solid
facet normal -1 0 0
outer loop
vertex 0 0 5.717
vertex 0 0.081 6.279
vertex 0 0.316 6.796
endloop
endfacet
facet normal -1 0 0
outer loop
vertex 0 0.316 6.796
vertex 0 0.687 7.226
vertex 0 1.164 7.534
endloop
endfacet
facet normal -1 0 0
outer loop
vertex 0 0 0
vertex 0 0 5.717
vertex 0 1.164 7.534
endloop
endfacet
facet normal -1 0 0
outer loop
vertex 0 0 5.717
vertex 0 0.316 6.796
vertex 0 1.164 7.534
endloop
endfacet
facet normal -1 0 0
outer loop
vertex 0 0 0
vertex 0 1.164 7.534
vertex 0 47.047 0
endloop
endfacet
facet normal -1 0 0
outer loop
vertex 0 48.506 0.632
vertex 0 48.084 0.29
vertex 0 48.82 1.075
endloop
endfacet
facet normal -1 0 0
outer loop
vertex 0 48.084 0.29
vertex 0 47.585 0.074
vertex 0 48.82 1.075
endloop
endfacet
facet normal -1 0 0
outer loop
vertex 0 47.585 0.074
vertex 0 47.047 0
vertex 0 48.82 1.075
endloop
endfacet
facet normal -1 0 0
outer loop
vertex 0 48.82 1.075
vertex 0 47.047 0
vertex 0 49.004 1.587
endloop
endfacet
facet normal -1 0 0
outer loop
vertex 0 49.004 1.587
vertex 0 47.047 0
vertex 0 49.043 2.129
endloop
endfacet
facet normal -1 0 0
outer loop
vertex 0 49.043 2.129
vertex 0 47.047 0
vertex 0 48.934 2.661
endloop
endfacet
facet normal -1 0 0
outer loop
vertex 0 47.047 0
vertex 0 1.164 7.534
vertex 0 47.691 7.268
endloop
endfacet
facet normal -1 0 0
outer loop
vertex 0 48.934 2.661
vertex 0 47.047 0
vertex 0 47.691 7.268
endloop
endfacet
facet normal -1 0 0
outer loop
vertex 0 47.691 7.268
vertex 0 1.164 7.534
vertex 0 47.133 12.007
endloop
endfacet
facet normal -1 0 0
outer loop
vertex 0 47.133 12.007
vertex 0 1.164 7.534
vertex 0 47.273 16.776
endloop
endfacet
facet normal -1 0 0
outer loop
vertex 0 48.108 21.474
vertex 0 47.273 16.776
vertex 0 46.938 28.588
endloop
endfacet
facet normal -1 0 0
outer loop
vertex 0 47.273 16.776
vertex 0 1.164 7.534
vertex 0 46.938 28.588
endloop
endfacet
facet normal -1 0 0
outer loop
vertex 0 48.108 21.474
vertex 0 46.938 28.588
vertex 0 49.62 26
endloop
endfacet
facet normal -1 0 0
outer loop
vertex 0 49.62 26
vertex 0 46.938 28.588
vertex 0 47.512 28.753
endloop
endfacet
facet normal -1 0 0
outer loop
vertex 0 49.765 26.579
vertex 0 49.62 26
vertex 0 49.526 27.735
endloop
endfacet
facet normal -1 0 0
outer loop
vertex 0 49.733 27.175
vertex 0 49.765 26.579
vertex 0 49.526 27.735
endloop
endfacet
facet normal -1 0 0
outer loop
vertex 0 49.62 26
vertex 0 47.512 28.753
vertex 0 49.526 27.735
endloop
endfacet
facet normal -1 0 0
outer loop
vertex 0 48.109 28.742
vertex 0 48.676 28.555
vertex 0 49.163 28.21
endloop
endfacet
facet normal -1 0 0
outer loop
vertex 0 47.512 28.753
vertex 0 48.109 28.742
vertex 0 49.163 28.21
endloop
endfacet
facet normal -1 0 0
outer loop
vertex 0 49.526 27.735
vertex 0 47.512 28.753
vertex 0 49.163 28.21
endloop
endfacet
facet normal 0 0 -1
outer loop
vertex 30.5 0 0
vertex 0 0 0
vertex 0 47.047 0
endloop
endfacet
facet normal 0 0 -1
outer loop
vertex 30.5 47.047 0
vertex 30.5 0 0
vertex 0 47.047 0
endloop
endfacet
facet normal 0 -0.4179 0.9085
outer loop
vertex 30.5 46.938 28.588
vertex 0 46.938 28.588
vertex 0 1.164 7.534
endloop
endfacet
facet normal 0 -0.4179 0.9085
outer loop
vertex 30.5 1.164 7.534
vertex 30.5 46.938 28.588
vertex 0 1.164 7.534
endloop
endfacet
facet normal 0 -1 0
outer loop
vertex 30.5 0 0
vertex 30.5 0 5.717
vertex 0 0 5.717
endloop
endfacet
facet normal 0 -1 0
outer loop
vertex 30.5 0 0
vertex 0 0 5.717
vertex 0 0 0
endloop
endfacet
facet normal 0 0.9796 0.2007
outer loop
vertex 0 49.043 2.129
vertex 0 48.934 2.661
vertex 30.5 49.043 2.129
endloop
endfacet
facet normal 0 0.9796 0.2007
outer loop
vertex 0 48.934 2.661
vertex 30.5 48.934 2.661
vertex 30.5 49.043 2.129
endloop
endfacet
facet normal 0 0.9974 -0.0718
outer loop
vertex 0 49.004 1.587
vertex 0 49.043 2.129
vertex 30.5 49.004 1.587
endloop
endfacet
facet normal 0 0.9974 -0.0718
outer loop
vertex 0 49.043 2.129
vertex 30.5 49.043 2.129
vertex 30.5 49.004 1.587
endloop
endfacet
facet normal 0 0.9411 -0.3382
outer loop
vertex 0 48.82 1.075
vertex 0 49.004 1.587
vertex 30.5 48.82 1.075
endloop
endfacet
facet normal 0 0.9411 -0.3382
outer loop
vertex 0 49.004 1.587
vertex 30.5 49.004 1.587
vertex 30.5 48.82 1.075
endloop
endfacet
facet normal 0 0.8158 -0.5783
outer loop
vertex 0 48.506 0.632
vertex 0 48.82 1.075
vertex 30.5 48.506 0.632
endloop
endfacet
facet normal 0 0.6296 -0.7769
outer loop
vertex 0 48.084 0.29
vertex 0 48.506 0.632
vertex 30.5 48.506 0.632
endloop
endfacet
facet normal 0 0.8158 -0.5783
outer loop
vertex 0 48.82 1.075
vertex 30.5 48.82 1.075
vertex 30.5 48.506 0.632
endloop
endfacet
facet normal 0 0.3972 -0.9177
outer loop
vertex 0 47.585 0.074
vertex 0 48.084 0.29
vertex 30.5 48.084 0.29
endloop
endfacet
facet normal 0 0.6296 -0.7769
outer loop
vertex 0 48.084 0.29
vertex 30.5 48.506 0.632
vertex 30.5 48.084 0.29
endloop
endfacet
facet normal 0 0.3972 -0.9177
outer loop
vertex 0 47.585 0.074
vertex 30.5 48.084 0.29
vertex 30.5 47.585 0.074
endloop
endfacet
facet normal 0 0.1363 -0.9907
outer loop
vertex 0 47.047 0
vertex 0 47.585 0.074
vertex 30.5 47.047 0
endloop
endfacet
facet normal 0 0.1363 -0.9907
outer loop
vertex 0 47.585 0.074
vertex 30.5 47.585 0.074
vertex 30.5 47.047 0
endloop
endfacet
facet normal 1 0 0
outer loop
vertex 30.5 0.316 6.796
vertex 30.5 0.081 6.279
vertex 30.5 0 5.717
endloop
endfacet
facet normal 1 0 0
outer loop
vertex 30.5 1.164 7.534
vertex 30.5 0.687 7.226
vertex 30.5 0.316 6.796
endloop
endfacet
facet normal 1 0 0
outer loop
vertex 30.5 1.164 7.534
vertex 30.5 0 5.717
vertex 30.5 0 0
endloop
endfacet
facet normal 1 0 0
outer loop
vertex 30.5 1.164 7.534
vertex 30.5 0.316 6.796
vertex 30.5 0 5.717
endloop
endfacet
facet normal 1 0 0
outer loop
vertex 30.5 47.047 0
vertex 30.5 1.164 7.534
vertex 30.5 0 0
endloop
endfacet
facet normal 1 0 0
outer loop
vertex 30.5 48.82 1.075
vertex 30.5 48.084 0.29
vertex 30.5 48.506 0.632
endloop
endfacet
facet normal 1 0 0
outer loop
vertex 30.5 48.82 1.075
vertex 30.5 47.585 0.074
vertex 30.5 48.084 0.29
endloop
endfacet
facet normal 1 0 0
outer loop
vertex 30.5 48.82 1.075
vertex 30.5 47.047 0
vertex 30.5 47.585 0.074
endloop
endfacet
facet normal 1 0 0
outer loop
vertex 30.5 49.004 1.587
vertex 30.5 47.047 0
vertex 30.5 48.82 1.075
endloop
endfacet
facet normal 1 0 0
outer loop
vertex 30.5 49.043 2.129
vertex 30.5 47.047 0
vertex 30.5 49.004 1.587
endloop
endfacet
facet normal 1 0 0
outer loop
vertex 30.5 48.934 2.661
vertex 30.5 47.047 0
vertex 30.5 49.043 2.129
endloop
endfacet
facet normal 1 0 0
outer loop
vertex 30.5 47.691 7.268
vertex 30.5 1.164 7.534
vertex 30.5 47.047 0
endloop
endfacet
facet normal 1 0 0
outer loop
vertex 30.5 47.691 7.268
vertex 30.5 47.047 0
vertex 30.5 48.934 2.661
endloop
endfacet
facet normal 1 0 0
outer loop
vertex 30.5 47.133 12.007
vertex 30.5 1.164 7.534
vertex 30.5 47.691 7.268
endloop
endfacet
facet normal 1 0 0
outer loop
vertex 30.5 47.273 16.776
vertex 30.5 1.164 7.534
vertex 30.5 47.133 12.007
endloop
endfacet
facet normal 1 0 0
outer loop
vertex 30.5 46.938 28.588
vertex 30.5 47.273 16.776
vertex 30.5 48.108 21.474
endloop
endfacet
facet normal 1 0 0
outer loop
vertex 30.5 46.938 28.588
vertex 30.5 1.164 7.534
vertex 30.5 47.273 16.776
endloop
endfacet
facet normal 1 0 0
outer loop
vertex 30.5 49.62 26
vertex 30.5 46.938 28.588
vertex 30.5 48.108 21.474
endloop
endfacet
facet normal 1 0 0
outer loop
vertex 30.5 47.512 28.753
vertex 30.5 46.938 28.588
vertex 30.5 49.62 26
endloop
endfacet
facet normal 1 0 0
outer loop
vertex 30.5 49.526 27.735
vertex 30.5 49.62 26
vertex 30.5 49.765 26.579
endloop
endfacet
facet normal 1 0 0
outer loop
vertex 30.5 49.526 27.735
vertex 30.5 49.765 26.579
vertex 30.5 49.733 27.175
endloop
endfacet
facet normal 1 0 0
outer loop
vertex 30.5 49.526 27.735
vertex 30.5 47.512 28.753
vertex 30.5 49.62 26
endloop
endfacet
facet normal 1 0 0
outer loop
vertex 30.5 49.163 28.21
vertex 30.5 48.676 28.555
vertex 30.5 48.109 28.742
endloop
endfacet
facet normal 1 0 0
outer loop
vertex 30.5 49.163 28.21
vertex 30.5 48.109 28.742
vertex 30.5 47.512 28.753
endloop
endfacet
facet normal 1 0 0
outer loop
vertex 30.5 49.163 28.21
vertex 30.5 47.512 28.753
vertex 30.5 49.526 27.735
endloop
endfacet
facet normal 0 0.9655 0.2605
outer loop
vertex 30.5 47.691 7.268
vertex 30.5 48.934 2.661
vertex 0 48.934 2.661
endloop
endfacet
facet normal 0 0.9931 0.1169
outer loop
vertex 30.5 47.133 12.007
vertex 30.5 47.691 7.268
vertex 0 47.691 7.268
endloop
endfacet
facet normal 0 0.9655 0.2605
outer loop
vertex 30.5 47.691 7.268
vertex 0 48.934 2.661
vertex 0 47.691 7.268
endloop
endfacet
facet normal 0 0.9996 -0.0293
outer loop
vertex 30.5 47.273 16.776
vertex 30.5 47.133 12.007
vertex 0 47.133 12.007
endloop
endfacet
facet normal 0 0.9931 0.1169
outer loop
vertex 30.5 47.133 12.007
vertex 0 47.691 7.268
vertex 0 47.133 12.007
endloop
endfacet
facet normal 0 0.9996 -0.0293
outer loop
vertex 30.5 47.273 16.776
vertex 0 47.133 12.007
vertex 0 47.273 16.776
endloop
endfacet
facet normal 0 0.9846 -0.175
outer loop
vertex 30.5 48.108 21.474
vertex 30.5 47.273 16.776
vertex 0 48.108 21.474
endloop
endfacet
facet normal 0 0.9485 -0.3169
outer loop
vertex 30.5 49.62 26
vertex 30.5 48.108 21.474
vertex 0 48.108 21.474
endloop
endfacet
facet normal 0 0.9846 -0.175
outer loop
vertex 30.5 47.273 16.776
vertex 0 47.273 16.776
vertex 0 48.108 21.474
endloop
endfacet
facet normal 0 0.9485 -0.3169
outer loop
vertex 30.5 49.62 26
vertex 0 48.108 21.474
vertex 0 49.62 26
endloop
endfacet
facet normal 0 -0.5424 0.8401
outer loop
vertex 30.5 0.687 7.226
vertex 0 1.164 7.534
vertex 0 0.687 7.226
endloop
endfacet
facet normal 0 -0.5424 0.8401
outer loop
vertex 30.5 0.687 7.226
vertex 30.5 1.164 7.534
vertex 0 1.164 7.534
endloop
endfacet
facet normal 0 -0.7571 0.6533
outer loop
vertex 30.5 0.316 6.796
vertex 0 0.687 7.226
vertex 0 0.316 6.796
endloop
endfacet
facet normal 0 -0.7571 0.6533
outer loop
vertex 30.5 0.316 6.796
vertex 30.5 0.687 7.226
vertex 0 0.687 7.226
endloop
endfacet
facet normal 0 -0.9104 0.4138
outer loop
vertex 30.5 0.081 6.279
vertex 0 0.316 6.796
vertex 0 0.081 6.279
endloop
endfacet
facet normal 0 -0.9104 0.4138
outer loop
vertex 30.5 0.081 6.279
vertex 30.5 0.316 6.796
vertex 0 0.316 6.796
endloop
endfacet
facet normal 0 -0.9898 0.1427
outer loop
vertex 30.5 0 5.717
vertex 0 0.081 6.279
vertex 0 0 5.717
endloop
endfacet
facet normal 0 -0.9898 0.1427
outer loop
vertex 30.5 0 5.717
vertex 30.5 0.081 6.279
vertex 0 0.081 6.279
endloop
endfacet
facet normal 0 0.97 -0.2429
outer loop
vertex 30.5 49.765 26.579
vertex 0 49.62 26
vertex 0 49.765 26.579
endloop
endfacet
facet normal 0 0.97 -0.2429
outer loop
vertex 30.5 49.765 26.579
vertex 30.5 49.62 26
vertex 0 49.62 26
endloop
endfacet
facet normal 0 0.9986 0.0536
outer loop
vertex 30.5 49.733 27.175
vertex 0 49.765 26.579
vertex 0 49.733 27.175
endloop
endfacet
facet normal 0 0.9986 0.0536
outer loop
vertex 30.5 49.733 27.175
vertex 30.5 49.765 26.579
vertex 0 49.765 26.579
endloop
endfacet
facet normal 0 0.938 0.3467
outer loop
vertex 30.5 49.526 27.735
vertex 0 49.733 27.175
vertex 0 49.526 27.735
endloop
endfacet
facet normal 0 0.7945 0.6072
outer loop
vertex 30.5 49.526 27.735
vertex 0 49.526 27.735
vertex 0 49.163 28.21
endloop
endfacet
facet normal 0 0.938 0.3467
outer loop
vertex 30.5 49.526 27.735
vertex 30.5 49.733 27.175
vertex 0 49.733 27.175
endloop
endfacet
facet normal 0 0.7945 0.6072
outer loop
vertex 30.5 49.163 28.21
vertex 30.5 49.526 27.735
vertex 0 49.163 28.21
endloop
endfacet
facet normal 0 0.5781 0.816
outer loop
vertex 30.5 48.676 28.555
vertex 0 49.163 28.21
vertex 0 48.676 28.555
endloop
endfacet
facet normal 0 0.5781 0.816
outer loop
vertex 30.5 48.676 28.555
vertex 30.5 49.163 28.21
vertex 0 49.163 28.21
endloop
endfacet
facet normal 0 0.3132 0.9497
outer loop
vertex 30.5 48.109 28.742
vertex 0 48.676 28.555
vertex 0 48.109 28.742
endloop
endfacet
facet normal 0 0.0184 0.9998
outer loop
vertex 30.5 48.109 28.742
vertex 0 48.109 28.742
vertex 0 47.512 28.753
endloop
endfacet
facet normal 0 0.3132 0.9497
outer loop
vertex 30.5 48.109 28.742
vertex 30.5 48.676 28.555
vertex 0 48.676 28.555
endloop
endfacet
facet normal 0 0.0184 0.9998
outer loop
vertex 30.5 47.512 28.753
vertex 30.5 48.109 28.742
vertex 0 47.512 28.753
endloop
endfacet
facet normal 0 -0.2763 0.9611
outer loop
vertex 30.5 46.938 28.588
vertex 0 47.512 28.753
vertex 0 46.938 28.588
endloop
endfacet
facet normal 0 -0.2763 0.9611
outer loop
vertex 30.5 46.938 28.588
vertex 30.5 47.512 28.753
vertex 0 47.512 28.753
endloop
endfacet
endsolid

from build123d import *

# Parameters (mm, degrees)
F1_DEPTH = 30.5
F2_R     = 2
F3_R     = 2


with BuildPart() as f1:
    # F0 (on Right) → F1 (new body)
    with BuildSketch(Plane.YZ):
        with BuildLine():
            Line((0, 6.9982859343), (0, 0))
            Line((0, 0), (50, 0))
            ThreePointArc((50, 0), (47.1879454394, 15.8045232241), (52.2596416003, 31.035035469))
            Line((52.2596416003, 31.035035469), (0, 6.9982859343))
        make_face()
    extrude(amount=F1_DEPTH)

    # F2
    f2_edges = [f1.edges().sort_by_distance(p)[0] for p in [
        (15.25, 52.259642, 31.035035),
    ]]
    fillet(f2_edges, radius=F2_R)

    # F3
    f3_edges = [f1.edges().sort_by_distance(p)[0] for p in [
        (15.25, 0, 6.998286),
        (15.25, 50, 0),
    ]]
    fillet(f3_edges, radius=F3_R)


solid = f1.part
